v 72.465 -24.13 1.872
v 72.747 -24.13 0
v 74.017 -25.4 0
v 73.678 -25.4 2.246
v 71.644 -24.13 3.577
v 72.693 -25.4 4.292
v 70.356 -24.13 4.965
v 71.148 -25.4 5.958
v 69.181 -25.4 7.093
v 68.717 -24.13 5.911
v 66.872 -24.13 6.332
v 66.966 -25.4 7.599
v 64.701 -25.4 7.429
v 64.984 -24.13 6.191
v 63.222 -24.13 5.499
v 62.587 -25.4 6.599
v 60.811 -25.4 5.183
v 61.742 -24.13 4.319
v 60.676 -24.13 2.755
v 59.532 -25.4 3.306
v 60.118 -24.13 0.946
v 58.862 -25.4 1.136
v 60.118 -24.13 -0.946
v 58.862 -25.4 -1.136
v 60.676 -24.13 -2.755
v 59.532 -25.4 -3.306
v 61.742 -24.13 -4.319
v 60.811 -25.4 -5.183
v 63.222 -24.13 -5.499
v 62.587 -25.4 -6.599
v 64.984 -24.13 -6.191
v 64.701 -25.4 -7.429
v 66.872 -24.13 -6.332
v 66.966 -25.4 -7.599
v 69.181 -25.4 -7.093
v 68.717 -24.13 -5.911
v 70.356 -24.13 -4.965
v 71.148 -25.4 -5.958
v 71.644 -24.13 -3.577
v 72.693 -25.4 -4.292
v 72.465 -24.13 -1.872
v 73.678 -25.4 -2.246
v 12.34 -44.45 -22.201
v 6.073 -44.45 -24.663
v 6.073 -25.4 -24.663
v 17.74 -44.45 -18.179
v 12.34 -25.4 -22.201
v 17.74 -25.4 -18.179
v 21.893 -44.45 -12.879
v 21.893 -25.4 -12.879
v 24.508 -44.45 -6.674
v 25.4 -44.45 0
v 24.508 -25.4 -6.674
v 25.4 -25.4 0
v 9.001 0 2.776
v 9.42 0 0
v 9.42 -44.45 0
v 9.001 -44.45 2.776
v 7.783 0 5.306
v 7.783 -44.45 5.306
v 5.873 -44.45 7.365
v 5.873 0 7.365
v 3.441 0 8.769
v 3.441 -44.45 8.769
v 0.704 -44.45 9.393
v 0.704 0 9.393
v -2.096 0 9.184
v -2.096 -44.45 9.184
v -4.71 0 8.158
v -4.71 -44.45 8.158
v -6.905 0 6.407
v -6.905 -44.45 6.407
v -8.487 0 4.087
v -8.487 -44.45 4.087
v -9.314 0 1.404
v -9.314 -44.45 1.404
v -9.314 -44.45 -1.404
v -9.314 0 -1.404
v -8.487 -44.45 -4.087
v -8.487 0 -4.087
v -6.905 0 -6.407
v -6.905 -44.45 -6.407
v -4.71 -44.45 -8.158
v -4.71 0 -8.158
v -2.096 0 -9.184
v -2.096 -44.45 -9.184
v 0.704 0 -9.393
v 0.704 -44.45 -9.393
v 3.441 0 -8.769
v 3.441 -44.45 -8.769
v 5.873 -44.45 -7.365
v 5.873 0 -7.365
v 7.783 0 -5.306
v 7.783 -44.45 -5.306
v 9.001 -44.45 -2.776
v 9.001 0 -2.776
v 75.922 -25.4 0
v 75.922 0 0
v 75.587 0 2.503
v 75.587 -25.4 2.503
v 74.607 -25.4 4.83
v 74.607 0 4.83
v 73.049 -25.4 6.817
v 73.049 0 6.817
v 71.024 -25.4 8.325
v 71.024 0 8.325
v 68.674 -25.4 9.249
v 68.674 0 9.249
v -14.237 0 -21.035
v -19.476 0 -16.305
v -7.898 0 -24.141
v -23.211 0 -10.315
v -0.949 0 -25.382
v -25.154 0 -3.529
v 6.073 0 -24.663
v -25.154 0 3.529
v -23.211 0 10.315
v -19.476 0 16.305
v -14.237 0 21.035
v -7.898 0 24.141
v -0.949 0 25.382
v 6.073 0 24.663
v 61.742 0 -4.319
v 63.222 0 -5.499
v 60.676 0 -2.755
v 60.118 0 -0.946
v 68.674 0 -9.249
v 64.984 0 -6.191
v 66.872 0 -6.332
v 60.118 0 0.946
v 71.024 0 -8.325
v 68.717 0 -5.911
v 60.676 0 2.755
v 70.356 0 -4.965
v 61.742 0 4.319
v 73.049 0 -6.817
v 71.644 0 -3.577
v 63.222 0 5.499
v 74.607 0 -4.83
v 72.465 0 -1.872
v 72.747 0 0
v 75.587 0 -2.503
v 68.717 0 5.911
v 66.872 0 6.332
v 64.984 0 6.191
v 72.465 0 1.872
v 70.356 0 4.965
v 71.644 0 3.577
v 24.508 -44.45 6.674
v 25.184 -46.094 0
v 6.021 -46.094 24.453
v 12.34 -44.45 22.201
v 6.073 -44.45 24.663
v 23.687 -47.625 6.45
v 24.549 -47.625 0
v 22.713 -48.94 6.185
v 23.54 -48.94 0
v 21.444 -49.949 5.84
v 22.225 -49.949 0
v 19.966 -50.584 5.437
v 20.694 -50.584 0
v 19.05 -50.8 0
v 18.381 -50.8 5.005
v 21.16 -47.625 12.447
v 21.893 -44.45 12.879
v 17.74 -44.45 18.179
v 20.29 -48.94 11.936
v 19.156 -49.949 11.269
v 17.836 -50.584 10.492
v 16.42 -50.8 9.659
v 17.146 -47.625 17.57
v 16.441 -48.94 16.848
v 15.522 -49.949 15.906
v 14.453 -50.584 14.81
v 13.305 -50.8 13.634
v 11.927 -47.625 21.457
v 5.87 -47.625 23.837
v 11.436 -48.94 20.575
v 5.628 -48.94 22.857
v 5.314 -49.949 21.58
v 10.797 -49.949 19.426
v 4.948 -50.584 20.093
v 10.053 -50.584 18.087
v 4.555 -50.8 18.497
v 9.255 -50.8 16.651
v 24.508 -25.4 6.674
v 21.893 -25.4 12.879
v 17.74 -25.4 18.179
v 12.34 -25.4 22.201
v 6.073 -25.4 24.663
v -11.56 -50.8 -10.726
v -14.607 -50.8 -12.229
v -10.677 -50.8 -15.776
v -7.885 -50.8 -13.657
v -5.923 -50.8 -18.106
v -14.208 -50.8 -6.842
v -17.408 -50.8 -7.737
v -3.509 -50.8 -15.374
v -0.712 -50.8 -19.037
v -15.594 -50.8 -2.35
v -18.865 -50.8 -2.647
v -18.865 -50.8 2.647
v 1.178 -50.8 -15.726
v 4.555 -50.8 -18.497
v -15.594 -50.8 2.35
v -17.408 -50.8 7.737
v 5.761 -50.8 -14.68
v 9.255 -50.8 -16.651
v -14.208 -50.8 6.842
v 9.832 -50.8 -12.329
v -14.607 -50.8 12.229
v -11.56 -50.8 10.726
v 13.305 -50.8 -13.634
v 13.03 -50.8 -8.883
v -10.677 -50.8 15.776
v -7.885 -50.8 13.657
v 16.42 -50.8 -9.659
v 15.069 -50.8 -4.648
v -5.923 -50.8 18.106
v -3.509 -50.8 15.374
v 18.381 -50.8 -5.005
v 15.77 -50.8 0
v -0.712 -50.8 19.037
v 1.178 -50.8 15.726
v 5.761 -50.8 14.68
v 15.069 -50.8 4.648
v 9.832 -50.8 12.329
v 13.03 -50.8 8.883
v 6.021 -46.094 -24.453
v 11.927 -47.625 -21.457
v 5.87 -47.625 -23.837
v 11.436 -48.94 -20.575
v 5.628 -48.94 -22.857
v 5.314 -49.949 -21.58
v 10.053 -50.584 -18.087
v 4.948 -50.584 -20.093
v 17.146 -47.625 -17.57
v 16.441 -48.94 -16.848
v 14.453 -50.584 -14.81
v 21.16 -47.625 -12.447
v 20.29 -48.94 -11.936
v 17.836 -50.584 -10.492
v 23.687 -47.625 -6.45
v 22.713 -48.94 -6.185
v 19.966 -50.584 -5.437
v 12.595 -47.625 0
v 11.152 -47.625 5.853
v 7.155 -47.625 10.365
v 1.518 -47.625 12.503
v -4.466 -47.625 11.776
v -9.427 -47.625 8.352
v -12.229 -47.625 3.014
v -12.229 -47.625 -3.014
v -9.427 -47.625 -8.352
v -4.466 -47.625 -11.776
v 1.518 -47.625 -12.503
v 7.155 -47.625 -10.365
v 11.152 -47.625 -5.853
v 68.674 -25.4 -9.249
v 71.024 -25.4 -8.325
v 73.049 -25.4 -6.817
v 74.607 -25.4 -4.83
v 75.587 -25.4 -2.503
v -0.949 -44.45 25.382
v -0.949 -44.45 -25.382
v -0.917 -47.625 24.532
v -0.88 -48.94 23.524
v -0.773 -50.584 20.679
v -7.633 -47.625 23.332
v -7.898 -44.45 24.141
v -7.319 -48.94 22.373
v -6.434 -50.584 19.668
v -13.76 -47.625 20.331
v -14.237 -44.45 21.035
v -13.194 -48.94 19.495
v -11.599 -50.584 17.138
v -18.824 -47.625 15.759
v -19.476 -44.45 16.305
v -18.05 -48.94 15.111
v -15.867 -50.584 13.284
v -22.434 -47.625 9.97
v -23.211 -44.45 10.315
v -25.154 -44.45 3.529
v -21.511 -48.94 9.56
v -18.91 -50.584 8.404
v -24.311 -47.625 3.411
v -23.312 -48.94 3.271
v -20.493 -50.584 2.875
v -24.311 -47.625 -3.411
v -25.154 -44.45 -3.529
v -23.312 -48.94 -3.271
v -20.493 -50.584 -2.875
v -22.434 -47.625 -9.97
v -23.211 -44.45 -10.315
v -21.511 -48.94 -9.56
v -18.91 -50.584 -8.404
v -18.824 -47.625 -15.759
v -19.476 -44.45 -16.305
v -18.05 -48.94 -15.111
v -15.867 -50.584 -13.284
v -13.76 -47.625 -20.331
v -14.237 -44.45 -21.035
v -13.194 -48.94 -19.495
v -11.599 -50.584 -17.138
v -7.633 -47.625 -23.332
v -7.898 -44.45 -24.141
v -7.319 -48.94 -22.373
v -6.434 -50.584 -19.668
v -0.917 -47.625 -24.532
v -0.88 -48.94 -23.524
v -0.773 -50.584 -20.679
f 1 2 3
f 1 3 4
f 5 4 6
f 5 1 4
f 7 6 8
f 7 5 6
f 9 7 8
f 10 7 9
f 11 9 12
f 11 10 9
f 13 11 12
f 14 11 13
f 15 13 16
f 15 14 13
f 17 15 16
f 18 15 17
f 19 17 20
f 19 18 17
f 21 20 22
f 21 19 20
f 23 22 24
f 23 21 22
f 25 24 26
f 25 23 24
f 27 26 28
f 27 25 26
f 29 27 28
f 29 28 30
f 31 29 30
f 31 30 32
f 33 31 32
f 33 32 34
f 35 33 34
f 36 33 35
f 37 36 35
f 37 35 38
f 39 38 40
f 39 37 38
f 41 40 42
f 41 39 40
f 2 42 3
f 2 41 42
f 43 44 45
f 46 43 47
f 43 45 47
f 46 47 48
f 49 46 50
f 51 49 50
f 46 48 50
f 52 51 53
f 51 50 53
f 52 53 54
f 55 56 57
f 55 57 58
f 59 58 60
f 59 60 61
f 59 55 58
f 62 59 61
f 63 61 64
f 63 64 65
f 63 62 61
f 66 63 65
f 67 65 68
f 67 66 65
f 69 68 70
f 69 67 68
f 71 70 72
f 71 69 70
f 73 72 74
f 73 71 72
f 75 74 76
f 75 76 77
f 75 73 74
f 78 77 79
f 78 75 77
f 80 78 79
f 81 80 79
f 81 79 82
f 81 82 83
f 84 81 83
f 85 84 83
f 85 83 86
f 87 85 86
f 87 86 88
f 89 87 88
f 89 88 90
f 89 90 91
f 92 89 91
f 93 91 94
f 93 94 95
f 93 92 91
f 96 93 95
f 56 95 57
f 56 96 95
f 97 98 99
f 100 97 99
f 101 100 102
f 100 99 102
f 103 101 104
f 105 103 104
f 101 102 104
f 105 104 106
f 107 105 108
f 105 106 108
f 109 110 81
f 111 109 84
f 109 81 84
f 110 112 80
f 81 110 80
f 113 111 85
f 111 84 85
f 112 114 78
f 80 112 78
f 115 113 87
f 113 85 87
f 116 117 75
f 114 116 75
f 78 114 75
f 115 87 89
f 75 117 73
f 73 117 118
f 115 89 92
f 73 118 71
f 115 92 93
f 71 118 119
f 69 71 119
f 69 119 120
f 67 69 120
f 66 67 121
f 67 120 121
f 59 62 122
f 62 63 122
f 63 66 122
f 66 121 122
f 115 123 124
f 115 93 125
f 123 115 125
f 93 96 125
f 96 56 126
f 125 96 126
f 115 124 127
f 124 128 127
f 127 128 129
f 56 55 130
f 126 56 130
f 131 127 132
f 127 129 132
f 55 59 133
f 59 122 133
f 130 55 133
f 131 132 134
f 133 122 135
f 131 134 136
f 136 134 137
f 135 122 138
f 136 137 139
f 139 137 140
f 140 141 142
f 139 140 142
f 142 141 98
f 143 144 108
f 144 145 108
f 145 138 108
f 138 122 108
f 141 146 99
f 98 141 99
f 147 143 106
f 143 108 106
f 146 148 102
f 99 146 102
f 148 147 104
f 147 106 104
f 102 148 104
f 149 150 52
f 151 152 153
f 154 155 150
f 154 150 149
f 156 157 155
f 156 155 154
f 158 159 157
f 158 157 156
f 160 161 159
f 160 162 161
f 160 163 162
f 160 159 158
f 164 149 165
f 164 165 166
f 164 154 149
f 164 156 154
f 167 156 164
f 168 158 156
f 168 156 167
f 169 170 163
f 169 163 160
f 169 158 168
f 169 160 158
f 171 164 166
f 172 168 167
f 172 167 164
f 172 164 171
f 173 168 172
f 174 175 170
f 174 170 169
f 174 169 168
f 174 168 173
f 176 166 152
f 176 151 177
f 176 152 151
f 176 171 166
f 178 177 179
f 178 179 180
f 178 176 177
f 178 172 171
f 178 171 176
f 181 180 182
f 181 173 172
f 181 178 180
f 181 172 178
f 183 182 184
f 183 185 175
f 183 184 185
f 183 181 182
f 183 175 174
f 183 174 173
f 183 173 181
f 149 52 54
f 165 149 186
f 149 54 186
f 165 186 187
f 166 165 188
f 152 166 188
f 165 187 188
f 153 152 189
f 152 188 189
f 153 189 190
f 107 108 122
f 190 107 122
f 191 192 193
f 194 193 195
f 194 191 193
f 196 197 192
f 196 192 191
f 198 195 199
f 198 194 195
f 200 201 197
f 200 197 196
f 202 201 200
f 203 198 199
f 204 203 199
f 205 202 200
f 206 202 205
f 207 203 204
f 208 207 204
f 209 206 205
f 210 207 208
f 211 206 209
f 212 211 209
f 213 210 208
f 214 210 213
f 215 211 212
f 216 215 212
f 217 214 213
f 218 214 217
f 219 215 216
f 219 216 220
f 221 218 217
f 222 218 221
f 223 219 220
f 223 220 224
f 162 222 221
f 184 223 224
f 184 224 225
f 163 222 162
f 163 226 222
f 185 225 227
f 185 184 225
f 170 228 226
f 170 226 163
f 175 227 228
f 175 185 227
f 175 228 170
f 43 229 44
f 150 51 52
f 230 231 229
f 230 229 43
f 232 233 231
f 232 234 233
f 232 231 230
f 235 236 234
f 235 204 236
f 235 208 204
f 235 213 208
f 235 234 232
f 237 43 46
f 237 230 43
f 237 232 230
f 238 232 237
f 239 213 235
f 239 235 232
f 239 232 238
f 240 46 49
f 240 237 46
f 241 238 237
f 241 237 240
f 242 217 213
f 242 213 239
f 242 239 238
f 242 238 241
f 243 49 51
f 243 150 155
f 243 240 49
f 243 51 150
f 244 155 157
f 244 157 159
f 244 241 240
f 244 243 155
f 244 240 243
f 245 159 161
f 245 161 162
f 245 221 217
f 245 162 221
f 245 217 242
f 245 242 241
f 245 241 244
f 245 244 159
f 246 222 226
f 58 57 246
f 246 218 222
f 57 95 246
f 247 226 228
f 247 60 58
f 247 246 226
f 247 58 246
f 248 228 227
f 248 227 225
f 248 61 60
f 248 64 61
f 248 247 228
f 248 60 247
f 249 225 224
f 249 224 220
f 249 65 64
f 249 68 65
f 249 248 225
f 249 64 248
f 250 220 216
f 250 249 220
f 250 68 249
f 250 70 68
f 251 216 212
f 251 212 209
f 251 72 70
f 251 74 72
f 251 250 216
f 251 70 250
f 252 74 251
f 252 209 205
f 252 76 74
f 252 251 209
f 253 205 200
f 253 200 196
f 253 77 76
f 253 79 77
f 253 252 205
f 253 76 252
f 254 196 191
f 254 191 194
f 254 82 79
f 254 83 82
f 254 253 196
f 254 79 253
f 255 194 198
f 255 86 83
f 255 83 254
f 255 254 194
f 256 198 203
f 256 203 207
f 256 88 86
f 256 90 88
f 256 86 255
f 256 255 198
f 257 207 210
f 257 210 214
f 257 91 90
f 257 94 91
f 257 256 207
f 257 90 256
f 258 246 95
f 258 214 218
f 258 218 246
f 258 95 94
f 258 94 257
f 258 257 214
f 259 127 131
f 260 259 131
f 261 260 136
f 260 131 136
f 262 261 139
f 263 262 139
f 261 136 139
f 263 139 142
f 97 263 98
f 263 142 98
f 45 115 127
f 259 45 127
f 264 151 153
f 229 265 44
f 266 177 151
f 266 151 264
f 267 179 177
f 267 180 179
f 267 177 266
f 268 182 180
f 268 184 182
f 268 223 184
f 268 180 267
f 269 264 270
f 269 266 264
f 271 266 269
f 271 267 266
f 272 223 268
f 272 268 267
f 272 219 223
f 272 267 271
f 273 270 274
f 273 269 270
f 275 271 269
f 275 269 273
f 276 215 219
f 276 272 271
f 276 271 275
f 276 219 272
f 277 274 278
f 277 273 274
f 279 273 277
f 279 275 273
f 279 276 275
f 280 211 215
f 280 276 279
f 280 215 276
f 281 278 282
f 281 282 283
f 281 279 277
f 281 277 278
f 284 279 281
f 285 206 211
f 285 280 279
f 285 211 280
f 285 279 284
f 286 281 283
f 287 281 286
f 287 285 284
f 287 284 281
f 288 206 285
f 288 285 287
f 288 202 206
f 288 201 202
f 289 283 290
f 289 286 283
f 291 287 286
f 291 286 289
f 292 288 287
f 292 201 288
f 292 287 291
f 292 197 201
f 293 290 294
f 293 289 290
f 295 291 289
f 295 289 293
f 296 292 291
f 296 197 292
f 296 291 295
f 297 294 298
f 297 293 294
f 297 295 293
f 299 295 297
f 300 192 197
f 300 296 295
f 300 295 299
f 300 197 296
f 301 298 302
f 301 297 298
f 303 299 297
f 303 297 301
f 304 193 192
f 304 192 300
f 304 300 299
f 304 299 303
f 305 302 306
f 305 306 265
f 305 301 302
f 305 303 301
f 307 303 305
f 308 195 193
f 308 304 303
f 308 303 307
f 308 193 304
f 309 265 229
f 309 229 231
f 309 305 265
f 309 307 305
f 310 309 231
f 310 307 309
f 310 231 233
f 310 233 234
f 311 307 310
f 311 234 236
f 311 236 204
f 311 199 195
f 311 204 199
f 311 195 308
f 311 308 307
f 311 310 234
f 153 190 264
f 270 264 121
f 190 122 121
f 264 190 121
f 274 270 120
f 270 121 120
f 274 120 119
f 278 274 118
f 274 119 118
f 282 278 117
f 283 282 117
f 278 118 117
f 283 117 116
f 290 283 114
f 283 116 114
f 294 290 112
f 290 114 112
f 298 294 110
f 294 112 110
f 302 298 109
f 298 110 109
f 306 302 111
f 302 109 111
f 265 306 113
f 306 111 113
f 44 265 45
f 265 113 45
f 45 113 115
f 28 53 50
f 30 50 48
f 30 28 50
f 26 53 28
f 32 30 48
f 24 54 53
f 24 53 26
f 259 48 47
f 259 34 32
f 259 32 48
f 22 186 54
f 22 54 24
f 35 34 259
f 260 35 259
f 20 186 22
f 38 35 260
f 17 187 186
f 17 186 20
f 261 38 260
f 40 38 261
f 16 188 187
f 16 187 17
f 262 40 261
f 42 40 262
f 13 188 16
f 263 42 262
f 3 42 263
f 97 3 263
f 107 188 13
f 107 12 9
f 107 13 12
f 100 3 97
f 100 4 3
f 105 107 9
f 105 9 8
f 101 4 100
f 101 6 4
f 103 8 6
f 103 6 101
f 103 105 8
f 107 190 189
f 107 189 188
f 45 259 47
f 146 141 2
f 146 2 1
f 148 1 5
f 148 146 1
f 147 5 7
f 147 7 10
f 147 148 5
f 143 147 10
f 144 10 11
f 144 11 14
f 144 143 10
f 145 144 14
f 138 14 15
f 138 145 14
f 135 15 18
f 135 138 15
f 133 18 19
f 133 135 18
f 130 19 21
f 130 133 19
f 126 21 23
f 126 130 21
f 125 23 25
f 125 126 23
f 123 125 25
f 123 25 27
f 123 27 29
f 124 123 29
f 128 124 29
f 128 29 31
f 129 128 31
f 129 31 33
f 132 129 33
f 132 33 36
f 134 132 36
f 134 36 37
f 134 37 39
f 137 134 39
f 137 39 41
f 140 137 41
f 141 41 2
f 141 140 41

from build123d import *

# Parameters (mm, degrees)
F0_R     = 9.419676
F0_R_2   = 6.35
F1_DEPTH = 25.4
F2_DEPTH = 50.8
F3_R     = 6.35
F4_SIZE  = 6.35
F5_SIZE  = 1.27


with BuildPart() as f1:
    # F0 (on Front) → F1 (new body)
    with BuildSketch(Plane.XZ):
        with BuildLine():
            ThreePointArc((6.072938, -24.663321), (19.992657, -15.666962), (25.4, 0))
            ThreePointArc((25.4, 0), (19.992657, 15.666962), (6.072938, 24.663321))
            ThreePointArc((6.072938, 24.663321), (-25.4, 0), (6.072938, -24.663321))
        make_face()
        Circle(F0_R, mode=Mode.SUBTRACT)
        with BuildLine():
            ThreePointArc((6.072938, 24.663321), (19.992657, 15.666962), (25.4, 0))
            ThreePointArc((25.4, 0), (19.992657, -15.666962), (6.072938, -24.663321))
            Line((6.072938, -24.663321), (68.674372, -9.248746))
            ThreePointArc((68.674372, -9.248746), (56.87202, 0), (68.674372, 9.248746))
            Line((68.674372, 9.248746), (6.072938, 24.663321))
        make_face()
        with BuildLine():
            ThreePointArc((75.92202, 0), (73.894266, 5.875111), (68.674372, 9.248746))
            ThreePointArc((68.674372, 9.248746), (56.87202, 0), (68.674372, -9.248746))
            ThreePointArc((68.674372, -9.248746), (73.894266, -5.875111), (75.92202, 0))
        make_face()
        with Locations((66.39702, 0)):
            Circle(F0_R_2, mode=Mode.SUBTRACT)
    extrude(amount=F1_DEPTH)

    # F0 (on Front) → F2 (join)
    with BuildSketch(Plane.XZ):
        with BuildLine():
            ThreePointArc((6.072938, -24.663321), (19.992657, -15.666962), (25.4, 0))
            ThreePointArc((25.4, 0), (19.992657, 15.666962), (6.072938, 24.663321))
            ThreePointArc((6.072938, 24.663321), (-25.4, 0), (6.072938, -24.663321))
        make_face()
        Circle(F0_R, mode=Mode.SUBTRACT)
    extrude(amount=F2_DEPTH)

    # F3
    f3_edges = [f1.edges().sort_by_distance(p)[0] for p in [
        (-6.072938, -50.8, 24.663321),
    ]]
    fillet(f3_edges, radius=F3_R)

    # F4
    f4_edges = [f1.edges().sort_by_distance(p)[0] for p in [
        (-9.419676, -50.8, 0),
    ]]
    chamfer(f4_edges, length=F4_SIZE)

    # F5
    f5_edges = [f1.edges().sort_by_distance(p)[0] for p in [
        (60.04702, -25.4, 0),
    ]]
    chamfer(f5_edges, length=F5_SIZE)


solid = f1.part
